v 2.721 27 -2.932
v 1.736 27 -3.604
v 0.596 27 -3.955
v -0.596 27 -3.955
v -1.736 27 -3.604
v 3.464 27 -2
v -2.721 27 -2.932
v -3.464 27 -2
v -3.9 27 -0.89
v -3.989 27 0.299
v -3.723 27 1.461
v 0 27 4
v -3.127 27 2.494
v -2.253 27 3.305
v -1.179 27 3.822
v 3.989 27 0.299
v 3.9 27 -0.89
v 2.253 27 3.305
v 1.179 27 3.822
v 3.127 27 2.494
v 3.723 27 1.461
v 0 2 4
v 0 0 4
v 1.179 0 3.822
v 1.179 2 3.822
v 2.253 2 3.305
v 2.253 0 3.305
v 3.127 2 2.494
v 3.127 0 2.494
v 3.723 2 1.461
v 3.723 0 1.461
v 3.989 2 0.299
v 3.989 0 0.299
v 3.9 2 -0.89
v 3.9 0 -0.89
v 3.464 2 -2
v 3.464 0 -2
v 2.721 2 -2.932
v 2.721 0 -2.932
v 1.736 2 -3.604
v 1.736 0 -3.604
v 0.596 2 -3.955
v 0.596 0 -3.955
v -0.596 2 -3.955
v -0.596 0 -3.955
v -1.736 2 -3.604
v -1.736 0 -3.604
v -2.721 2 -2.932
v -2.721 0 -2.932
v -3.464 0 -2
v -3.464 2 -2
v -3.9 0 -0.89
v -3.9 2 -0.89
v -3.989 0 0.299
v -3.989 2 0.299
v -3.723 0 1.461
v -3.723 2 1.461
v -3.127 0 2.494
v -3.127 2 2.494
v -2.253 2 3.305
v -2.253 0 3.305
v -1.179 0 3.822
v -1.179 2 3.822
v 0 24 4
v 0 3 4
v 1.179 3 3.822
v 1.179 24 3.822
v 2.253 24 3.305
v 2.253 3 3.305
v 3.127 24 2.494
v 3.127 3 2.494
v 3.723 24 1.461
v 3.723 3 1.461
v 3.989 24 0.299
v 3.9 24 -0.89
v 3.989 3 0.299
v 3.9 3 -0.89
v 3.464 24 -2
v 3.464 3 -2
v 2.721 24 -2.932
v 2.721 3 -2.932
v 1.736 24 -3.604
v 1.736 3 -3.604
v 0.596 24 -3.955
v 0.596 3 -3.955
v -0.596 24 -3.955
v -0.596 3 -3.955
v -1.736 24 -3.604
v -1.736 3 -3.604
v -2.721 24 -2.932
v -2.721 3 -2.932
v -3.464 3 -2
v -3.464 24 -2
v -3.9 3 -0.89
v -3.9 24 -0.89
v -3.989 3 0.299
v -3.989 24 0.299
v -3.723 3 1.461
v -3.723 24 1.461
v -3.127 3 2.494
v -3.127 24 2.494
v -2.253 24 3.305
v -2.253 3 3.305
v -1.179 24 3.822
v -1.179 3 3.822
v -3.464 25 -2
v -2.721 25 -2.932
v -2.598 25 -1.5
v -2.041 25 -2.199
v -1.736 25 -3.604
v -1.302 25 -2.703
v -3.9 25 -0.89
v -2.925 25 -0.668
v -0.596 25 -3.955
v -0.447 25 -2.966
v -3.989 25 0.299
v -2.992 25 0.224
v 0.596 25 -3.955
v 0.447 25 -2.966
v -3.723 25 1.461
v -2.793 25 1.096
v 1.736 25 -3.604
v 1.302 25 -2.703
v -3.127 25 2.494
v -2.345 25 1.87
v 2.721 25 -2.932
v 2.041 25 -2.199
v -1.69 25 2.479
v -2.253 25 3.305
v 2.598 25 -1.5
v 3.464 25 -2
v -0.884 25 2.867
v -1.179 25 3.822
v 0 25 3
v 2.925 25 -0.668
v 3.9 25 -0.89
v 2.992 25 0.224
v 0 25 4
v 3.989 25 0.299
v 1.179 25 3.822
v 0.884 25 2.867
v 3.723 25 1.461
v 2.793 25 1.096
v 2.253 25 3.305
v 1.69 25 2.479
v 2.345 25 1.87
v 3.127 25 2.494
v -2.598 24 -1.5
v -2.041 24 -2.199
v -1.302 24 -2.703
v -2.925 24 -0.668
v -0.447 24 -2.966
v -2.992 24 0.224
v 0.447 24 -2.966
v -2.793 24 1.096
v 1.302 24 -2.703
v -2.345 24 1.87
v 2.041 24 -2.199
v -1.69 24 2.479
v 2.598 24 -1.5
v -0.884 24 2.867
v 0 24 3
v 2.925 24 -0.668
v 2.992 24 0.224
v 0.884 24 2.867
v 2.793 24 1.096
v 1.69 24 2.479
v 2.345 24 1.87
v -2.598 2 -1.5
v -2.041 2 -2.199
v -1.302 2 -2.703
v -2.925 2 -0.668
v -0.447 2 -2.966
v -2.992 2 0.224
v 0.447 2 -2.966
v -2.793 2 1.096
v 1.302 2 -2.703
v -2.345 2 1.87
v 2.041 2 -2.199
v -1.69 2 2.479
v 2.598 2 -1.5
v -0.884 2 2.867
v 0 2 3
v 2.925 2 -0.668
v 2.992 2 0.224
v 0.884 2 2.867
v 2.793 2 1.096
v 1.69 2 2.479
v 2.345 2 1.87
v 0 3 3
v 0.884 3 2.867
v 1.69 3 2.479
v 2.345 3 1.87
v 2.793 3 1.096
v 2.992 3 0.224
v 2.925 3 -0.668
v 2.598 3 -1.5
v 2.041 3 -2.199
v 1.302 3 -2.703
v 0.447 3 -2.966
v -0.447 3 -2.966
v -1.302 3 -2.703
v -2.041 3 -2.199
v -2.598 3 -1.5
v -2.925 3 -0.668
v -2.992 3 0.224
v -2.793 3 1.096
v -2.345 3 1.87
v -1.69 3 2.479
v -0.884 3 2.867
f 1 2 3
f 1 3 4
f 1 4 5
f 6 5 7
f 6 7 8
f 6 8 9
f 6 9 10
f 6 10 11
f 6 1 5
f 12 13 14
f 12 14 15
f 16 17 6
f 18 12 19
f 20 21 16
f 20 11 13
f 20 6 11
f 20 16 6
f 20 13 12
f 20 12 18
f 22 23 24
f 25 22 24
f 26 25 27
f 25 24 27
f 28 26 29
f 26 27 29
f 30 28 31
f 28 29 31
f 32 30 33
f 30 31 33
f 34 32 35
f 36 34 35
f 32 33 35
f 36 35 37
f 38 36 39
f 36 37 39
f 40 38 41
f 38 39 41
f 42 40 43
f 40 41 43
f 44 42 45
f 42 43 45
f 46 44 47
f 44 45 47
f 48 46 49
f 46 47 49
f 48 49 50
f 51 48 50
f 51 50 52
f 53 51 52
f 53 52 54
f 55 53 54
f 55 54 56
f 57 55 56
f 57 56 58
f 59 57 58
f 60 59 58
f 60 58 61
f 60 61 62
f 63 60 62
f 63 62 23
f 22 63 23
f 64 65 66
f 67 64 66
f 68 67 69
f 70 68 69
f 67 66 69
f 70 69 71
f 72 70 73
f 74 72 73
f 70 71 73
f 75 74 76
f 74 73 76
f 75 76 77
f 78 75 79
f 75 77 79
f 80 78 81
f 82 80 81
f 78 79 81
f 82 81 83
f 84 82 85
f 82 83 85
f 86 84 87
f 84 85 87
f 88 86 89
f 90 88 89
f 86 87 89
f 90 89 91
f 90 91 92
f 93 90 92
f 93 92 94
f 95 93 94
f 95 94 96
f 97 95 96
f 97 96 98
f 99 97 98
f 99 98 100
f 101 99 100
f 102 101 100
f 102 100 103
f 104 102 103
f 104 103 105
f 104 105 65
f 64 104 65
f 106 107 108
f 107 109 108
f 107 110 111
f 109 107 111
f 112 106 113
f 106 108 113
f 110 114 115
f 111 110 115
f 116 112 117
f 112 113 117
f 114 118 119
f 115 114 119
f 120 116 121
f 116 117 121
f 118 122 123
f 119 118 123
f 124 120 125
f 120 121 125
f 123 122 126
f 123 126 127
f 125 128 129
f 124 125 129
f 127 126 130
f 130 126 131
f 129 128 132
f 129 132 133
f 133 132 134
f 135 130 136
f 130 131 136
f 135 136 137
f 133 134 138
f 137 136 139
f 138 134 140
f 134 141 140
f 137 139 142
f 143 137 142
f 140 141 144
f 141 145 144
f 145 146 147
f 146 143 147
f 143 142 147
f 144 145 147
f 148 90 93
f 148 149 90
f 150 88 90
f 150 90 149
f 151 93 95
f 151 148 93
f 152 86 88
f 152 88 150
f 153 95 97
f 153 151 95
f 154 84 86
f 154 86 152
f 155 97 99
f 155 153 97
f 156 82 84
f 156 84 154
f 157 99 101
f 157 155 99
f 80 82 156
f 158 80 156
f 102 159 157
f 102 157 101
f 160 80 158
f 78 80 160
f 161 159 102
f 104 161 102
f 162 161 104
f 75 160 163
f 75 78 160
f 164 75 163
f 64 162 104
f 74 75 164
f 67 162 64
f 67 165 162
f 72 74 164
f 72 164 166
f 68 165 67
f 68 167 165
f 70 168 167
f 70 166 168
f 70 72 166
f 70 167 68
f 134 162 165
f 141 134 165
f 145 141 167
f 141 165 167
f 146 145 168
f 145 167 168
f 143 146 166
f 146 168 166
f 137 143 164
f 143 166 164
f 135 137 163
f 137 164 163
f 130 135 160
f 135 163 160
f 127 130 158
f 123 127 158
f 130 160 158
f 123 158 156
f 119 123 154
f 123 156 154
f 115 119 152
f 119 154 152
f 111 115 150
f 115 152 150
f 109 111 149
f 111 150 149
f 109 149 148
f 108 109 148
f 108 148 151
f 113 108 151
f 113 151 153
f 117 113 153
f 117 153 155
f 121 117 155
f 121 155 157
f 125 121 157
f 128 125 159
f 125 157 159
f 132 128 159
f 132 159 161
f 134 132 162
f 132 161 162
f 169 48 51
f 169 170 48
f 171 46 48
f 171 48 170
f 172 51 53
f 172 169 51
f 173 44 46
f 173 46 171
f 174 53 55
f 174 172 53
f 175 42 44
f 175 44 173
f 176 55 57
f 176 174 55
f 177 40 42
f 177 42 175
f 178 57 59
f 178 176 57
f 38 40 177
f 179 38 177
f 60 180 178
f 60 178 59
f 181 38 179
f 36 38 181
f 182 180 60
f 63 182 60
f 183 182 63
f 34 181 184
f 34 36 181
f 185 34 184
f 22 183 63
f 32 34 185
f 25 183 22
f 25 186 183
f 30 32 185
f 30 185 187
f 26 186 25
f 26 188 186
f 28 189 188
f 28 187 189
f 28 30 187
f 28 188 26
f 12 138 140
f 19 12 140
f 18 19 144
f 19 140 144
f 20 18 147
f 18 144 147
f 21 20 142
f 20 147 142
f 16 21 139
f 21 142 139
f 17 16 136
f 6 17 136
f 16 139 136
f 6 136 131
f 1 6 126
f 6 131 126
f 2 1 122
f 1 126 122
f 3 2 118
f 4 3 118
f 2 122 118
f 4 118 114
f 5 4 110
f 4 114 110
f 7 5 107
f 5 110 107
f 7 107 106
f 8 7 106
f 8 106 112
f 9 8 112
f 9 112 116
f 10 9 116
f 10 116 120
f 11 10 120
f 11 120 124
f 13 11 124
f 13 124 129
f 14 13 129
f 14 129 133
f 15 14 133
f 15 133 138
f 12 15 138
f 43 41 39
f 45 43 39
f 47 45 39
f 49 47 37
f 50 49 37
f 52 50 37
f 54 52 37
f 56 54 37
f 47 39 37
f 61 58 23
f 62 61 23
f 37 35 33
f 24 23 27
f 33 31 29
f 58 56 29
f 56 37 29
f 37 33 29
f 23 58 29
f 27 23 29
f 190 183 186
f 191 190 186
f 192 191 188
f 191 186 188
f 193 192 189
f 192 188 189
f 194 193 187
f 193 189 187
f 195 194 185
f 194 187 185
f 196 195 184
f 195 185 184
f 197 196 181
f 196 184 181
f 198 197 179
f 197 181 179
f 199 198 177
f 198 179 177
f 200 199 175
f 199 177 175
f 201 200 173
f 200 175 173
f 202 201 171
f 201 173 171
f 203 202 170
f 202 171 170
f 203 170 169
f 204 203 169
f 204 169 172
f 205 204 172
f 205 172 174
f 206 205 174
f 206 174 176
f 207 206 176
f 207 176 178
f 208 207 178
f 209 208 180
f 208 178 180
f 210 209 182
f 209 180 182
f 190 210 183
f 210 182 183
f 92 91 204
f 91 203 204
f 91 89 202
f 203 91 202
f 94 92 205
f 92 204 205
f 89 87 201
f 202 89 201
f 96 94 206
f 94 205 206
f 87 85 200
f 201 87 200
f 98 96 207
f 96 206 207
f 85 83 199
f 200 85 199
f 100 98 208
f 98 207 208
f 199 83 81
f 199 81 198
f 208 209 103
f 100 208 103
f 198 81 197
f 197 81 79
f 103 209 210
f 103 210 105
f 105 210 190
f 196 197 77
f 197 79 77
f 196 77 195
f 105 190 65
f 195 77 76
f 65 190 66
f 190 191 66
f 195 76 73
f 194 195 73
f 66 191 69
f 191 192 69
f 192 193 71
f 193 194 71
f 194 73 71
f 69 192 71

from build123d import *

# Parameters (mm, degrees)
SKETCH1_R           = 4
BOSS_EXTRUDE1_DEPTH = 27
CUT_EXTRUDE1_START  = -3
SKETCH2_R           = 4
SKETCH2_R_2         = 3
CUT_EXTRUDE1_DEPTH  = 1
CUT_EXTRUDE2_START  = -25
SKETCH2_2_R         = 4
SKETCH2_2_R_2       = 3
CUT_EXTRUDE2_DEPTH  = 1


with BuildPart() as part:
    # Sketch1 → Boss-Extrude1 (new body)
    with BuildSketch(Plane(origin=(0, 0, 0), x_dir=(1, 0, 0), z_dir=(0, 1, 0))):
        Circle(SKETCH1_R)
    extrude(amount=BOSS_EXTRUDE1_DEPTH)

    # Sketch2 → Cut-Extrude1 (cut)
    with BuildSketch(Plane(origin=(0, 27, 0), x_dir=(1, 0, 0), z_dir=(0, 1, 0)).offset(CUT_EXTRUDE1_START)):
        Circle(SKETCH2_R)
        Circle(SKETCH2_R_2, mode=Mode.SUBTRACT)
    extrude(amount=CUT_EXTRUDE1_DEPTH, mode=Mode.SUBTRACT)

    # Sketch2<2> → Cut-Extrude2 (cut)
    with BuildSketch(Plane(origin=(0, 27, 0), x_dir=(1, 0, 0), z_dir=(0, 1, 0)).offset(CUT_EXTRUDE2_START)):
        Circle(SKETCH2_2_R)
        Circle(SKETCH2_2_R_2, mode=Mode.SUBTRACT)
    extrude(amount=CUT_EXTRUDE2_DEPTH, mode=Mode.SUBTRACT)


solid = part.part
